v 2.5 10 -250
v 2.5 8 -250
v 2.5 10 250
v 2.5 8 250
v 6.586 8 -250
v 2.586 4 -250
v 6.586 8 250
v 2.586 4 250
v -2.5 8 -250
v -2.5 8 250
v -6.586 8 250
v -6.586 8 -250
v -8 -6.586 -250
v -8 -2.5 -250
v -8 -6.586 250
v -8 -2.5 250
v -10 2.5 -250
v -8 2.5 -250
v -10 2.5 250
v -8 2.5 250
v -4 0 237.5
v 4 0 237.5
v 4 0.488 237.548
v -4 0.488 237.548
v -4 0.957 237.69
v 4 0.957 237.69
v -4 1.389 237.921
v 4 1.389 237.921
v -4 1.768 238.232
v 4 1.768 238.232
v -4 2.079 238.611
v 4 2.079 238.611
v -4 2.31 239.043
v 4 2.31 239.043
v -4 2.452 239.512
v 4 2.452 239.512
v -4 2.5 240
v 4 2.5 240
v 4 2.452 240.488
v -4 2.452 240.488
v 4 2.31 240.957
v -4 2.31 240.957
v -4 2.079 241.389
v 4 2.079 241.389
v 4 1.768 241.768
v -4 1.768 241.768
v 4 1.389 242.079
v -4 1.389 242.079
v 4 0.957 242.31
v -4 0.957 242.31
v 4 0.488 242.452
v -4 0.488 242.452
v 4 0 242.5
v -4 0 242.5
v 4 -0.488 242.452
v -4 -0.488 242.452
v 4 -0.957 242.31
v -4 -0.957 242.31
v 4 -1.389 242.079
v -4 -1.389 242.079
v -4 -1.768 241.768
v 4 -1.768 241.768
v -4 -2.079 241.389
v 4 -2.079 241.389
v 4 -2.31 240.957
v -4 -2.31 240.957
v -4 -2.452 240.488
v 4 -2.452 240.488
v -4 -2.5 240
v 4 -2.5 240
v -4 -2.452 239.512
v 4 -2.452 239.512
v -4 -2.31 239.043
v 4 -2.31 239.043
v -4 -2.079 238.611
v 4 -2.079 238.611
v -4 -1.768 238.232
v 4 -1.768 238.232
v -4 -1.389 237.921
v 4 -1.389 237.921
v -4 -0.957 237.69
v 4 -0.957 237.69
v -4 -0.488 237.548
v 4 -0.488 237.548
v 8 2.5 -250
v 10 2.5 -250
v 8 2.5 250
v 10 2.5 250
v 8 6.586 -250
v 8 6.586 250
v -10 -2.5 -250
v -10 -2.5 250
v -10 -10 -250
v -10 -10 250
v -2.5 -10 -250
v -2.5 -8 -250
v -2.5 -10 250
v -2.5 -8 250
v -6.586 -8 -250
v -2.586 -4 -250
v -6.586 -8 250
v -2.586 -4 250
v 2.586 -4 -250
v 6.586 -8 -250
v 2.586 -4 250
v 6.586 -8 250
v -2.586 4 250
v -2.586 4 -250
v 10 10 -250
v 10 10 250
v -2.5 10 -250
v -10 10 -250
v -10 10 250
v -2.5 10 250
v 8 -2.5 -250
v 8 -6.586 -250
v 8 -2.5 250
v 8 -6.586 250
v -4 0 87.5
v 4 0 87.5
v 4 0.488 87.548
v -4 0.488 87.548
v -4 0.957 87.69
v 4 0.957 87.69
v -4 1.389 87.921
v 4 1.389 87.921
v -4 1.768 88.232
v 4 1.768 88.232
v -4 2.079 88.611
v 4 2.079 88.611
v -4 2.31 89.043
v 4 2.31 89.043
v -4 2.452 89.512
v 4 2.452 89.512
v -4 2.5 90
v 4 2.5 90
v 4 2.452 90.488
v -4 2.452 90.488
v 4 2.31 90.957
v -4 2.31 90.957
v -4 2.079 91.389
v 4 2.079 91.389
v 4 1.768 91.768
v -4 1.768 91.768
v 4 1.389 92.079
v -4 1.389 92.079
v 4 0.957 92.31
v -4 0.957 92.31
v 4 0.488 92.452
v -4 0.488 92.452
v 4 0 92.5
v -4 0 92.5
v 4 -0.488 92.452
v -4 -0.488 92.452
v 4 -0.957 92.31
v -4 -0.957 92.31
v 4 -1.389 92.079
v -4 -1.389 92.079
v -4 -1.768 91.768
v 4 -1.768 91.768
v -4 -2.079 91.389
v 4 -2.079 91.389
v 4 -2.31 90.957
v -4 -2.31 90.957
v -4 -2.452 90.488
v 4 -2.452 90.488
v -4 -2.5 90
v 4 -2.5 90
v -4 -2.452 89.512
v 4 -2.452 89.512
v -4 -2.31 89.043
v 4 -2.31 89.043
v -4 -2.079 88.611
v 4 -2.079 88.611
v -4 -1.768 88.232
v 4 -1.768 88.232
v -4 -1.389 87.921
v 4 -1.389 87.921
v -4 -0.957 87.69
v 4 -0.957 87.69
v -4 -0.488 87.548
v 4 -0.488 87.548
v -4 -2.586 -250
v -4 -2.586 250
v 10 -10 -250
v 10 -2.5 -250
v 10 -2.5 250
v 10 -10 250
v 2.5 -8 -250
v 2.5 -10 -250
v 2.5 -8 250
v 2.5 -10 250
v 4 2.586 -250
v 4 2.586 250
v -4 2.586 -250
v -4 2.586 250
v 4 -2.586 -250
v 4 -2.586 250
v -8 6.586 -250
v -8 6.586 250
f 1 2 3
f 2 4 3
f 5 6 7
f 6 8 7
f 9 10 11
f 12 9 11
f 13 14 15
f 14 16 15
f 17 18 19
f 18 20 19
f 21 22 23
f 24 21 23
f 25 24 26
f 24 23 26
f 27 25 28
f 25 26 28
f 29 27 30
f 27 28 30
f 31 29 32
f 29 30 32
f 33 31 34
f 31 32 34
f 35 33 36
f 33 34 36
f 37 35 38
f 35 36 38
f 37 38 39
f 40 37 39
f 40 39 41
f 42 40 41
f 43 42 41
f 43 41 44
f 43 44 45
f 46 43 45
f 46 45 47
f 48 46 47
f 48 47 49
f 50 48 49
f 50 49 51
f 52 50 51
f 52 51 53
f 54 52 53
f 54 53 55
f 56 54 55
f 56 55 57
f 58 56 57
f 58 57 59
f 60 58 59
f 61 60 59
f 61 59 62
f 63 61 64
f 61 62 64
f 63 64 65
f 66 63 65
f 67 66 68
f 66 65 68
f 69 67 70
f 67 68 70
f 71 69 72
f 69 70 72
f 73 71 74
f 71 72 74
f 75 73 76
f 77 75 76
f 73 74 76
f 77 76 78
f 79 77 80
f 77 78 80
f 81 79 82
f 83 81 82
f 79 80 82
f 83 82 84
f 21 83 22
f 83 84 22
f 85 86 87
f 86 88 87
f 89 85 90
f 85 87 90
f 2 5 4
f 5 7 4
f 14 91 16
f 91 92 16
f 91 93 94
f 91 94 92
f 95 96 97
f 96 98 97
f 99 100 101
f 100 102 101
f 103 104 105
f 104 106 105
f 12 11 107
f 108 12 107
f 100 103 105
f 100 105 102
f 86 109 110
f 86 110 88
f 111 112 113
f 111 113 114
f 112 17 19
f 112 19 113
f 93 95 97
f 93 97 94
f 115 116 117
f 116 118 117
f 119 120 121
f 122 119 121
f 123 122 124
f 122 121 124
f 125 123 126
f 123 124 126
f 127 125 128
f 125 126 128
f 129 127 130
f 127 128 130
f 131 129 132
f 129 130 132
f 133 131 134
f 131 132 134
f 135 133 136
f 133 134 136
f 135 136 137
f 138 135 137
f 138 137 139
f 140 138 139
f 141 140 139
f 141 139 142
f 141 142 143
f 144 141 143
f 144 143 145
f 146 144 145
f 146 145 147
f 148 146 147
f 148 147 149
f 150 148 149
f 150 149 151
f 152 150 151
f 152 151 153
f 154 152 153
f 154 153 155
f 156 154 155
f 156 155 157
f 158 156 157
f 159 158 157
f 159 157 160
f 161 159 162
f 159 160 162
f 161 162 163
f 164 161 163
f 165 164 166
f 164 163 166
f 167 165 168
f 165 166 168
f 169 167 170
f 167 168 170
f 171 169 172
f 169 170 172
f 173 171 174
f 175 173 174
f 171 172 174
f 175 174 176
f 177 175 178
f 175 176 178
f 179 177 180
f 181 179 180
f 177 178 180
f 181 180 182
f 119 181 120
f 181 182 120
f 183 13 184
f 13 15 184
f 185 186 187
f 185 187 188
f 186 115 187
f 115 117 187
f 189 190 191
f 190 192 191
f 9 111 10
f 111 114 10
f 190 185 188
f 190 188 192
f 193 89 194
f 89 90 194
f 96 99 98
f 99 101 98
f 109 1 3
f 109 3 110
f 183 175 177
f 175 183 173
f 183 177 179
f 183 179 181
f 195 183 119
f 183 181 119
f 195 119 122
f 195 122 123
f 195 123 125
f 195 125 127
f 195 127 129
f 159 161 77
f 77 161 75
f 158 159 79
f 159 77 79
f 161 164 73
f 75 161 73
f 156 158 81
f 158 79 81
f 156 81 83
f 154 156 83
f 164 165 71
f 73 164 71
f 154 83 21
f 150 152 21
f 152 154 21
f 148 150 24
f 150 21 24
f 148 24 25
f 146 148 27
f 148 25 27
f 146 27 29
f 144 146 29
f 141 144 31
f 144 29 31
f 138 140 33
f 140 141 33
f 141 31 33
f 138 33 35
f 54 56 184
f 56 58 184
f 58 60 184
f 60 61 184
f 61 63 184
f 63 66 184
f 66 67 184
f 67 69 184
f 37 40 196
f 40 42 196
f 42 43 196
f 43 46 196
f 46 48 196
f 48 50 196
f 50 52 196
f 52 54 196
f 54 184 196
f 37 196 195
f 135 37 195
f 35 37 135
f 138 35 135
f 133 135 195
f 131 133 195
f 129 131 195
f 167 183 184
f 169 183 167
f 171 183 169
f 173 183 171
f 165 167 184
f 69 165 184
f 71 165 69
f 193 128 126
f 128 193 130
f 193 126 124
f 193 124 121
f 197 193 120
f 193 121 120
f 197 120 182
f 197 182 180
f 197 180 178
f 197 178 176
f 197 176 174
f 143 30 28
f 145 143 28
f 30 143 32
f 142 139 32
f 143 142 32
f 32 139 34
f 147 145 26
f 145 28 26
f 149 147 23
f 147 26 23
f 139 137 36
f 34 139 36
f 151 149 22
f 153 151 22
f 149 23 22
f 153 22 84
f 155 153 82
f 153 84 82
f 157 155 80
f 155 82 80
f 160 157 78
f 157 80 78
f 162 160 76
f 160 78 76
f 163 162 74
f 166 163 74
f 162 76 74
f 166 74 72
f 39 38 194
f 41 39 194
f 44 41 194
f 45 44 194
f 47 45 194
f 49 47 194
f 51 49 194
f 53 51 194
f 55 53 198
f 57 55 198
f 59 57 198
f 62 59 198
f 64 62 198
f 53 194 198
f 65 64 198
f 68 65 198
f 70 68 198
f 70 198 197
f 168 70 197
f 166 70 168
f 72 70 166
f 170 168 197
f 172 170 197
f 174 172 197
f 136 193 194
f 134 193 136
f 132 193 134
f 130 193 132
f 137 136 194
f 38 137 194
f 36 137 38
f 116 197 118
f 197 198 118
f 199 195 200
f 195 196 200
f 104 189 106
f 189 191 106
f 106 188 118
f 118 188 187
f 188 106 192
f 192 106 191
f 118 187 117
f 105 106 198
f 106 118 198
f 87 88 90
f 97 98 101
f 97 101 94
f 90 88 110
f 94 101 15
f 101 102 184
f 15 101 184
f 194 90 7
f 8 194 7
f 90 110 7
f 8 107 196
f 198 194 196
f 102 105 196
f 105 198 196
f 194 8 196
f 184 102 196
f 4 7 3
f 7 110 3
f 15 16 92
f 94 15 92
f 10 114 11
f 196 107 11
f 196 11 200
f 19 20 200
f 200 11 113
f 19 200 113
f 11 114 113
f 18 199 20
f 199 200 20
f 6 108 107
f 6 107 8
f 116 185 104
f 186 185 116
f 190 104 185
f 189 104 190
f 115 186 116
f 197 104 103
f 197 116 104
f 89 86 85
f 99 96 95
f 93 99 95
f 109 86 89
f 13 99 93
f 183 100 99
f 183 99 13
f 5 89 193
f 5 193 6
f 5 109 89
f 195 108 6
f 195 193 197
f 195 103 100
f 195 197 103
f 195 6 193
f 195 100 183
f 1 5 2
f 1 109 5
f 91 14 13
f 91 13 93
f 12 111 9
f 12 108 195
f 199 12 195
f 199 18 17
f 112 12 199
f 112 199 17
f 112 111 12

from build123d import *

# Parameters (mm, degrees)
BOSS_EXTRUDE1_DEPTH = 250
SKETCH2_R           = 2.5
CUT_EXTRUDE1_DEPTH  = 10


with BuildPart() as part:
    # Sketch1 → Boss-Extrude1 (new body, symmetric)
    with BuildSketch(Plane.XY):
        Polygon((-2.585786438, 4), (2.585786438, 4), (6.585786438, 8), (2.5, 8), (2.5, 10), (10, 10), (10, 2.5), (8, 2.5), (8, 6.585786438), (4, 2.585786438), (4, -2.585786438), (8, -6.585786438), (8, -2.5), (10, -2.5), (10, -10), (2.5, -10), (2.5, -8), (6.585786438, -8), (2.585786438, -4), (-2.585786438, -4), (-6.585786438, -8), (-2.5, -8), (-2.5, -10), (-10, -10), (-10, -2.5), (-8, -2.5), (-8, -6.585786438), (-4, -2.585786438), (-4, 2.585786438), (-8, 6.585786438), (-8, 2.5), (-10, 2.5), (-10, 10), (-2.5, 10), (-2.5, 8), (-6.585786438, 8), align=None)
    extrude(amount=BOSS_EXTRUDE1_DEPTH, both=True)

    # Sketch2 → Cut-Extrude1 (cut)
    with BuildSketch(Plane(origin=(4, 0, 0), x_dir=(0, 0, -1), z_dir=(1, 0, 0))):
        with Locations((-240, 0)):
            Circle(SKETCH2_R)
        with Locations((-90, 0)):
            Circle(SKETCH2_R)
    extrude(amount=-CUT_EXTRUDE1_DEPTH, mode=Mode.SUBTRACT)


solid = part.part
